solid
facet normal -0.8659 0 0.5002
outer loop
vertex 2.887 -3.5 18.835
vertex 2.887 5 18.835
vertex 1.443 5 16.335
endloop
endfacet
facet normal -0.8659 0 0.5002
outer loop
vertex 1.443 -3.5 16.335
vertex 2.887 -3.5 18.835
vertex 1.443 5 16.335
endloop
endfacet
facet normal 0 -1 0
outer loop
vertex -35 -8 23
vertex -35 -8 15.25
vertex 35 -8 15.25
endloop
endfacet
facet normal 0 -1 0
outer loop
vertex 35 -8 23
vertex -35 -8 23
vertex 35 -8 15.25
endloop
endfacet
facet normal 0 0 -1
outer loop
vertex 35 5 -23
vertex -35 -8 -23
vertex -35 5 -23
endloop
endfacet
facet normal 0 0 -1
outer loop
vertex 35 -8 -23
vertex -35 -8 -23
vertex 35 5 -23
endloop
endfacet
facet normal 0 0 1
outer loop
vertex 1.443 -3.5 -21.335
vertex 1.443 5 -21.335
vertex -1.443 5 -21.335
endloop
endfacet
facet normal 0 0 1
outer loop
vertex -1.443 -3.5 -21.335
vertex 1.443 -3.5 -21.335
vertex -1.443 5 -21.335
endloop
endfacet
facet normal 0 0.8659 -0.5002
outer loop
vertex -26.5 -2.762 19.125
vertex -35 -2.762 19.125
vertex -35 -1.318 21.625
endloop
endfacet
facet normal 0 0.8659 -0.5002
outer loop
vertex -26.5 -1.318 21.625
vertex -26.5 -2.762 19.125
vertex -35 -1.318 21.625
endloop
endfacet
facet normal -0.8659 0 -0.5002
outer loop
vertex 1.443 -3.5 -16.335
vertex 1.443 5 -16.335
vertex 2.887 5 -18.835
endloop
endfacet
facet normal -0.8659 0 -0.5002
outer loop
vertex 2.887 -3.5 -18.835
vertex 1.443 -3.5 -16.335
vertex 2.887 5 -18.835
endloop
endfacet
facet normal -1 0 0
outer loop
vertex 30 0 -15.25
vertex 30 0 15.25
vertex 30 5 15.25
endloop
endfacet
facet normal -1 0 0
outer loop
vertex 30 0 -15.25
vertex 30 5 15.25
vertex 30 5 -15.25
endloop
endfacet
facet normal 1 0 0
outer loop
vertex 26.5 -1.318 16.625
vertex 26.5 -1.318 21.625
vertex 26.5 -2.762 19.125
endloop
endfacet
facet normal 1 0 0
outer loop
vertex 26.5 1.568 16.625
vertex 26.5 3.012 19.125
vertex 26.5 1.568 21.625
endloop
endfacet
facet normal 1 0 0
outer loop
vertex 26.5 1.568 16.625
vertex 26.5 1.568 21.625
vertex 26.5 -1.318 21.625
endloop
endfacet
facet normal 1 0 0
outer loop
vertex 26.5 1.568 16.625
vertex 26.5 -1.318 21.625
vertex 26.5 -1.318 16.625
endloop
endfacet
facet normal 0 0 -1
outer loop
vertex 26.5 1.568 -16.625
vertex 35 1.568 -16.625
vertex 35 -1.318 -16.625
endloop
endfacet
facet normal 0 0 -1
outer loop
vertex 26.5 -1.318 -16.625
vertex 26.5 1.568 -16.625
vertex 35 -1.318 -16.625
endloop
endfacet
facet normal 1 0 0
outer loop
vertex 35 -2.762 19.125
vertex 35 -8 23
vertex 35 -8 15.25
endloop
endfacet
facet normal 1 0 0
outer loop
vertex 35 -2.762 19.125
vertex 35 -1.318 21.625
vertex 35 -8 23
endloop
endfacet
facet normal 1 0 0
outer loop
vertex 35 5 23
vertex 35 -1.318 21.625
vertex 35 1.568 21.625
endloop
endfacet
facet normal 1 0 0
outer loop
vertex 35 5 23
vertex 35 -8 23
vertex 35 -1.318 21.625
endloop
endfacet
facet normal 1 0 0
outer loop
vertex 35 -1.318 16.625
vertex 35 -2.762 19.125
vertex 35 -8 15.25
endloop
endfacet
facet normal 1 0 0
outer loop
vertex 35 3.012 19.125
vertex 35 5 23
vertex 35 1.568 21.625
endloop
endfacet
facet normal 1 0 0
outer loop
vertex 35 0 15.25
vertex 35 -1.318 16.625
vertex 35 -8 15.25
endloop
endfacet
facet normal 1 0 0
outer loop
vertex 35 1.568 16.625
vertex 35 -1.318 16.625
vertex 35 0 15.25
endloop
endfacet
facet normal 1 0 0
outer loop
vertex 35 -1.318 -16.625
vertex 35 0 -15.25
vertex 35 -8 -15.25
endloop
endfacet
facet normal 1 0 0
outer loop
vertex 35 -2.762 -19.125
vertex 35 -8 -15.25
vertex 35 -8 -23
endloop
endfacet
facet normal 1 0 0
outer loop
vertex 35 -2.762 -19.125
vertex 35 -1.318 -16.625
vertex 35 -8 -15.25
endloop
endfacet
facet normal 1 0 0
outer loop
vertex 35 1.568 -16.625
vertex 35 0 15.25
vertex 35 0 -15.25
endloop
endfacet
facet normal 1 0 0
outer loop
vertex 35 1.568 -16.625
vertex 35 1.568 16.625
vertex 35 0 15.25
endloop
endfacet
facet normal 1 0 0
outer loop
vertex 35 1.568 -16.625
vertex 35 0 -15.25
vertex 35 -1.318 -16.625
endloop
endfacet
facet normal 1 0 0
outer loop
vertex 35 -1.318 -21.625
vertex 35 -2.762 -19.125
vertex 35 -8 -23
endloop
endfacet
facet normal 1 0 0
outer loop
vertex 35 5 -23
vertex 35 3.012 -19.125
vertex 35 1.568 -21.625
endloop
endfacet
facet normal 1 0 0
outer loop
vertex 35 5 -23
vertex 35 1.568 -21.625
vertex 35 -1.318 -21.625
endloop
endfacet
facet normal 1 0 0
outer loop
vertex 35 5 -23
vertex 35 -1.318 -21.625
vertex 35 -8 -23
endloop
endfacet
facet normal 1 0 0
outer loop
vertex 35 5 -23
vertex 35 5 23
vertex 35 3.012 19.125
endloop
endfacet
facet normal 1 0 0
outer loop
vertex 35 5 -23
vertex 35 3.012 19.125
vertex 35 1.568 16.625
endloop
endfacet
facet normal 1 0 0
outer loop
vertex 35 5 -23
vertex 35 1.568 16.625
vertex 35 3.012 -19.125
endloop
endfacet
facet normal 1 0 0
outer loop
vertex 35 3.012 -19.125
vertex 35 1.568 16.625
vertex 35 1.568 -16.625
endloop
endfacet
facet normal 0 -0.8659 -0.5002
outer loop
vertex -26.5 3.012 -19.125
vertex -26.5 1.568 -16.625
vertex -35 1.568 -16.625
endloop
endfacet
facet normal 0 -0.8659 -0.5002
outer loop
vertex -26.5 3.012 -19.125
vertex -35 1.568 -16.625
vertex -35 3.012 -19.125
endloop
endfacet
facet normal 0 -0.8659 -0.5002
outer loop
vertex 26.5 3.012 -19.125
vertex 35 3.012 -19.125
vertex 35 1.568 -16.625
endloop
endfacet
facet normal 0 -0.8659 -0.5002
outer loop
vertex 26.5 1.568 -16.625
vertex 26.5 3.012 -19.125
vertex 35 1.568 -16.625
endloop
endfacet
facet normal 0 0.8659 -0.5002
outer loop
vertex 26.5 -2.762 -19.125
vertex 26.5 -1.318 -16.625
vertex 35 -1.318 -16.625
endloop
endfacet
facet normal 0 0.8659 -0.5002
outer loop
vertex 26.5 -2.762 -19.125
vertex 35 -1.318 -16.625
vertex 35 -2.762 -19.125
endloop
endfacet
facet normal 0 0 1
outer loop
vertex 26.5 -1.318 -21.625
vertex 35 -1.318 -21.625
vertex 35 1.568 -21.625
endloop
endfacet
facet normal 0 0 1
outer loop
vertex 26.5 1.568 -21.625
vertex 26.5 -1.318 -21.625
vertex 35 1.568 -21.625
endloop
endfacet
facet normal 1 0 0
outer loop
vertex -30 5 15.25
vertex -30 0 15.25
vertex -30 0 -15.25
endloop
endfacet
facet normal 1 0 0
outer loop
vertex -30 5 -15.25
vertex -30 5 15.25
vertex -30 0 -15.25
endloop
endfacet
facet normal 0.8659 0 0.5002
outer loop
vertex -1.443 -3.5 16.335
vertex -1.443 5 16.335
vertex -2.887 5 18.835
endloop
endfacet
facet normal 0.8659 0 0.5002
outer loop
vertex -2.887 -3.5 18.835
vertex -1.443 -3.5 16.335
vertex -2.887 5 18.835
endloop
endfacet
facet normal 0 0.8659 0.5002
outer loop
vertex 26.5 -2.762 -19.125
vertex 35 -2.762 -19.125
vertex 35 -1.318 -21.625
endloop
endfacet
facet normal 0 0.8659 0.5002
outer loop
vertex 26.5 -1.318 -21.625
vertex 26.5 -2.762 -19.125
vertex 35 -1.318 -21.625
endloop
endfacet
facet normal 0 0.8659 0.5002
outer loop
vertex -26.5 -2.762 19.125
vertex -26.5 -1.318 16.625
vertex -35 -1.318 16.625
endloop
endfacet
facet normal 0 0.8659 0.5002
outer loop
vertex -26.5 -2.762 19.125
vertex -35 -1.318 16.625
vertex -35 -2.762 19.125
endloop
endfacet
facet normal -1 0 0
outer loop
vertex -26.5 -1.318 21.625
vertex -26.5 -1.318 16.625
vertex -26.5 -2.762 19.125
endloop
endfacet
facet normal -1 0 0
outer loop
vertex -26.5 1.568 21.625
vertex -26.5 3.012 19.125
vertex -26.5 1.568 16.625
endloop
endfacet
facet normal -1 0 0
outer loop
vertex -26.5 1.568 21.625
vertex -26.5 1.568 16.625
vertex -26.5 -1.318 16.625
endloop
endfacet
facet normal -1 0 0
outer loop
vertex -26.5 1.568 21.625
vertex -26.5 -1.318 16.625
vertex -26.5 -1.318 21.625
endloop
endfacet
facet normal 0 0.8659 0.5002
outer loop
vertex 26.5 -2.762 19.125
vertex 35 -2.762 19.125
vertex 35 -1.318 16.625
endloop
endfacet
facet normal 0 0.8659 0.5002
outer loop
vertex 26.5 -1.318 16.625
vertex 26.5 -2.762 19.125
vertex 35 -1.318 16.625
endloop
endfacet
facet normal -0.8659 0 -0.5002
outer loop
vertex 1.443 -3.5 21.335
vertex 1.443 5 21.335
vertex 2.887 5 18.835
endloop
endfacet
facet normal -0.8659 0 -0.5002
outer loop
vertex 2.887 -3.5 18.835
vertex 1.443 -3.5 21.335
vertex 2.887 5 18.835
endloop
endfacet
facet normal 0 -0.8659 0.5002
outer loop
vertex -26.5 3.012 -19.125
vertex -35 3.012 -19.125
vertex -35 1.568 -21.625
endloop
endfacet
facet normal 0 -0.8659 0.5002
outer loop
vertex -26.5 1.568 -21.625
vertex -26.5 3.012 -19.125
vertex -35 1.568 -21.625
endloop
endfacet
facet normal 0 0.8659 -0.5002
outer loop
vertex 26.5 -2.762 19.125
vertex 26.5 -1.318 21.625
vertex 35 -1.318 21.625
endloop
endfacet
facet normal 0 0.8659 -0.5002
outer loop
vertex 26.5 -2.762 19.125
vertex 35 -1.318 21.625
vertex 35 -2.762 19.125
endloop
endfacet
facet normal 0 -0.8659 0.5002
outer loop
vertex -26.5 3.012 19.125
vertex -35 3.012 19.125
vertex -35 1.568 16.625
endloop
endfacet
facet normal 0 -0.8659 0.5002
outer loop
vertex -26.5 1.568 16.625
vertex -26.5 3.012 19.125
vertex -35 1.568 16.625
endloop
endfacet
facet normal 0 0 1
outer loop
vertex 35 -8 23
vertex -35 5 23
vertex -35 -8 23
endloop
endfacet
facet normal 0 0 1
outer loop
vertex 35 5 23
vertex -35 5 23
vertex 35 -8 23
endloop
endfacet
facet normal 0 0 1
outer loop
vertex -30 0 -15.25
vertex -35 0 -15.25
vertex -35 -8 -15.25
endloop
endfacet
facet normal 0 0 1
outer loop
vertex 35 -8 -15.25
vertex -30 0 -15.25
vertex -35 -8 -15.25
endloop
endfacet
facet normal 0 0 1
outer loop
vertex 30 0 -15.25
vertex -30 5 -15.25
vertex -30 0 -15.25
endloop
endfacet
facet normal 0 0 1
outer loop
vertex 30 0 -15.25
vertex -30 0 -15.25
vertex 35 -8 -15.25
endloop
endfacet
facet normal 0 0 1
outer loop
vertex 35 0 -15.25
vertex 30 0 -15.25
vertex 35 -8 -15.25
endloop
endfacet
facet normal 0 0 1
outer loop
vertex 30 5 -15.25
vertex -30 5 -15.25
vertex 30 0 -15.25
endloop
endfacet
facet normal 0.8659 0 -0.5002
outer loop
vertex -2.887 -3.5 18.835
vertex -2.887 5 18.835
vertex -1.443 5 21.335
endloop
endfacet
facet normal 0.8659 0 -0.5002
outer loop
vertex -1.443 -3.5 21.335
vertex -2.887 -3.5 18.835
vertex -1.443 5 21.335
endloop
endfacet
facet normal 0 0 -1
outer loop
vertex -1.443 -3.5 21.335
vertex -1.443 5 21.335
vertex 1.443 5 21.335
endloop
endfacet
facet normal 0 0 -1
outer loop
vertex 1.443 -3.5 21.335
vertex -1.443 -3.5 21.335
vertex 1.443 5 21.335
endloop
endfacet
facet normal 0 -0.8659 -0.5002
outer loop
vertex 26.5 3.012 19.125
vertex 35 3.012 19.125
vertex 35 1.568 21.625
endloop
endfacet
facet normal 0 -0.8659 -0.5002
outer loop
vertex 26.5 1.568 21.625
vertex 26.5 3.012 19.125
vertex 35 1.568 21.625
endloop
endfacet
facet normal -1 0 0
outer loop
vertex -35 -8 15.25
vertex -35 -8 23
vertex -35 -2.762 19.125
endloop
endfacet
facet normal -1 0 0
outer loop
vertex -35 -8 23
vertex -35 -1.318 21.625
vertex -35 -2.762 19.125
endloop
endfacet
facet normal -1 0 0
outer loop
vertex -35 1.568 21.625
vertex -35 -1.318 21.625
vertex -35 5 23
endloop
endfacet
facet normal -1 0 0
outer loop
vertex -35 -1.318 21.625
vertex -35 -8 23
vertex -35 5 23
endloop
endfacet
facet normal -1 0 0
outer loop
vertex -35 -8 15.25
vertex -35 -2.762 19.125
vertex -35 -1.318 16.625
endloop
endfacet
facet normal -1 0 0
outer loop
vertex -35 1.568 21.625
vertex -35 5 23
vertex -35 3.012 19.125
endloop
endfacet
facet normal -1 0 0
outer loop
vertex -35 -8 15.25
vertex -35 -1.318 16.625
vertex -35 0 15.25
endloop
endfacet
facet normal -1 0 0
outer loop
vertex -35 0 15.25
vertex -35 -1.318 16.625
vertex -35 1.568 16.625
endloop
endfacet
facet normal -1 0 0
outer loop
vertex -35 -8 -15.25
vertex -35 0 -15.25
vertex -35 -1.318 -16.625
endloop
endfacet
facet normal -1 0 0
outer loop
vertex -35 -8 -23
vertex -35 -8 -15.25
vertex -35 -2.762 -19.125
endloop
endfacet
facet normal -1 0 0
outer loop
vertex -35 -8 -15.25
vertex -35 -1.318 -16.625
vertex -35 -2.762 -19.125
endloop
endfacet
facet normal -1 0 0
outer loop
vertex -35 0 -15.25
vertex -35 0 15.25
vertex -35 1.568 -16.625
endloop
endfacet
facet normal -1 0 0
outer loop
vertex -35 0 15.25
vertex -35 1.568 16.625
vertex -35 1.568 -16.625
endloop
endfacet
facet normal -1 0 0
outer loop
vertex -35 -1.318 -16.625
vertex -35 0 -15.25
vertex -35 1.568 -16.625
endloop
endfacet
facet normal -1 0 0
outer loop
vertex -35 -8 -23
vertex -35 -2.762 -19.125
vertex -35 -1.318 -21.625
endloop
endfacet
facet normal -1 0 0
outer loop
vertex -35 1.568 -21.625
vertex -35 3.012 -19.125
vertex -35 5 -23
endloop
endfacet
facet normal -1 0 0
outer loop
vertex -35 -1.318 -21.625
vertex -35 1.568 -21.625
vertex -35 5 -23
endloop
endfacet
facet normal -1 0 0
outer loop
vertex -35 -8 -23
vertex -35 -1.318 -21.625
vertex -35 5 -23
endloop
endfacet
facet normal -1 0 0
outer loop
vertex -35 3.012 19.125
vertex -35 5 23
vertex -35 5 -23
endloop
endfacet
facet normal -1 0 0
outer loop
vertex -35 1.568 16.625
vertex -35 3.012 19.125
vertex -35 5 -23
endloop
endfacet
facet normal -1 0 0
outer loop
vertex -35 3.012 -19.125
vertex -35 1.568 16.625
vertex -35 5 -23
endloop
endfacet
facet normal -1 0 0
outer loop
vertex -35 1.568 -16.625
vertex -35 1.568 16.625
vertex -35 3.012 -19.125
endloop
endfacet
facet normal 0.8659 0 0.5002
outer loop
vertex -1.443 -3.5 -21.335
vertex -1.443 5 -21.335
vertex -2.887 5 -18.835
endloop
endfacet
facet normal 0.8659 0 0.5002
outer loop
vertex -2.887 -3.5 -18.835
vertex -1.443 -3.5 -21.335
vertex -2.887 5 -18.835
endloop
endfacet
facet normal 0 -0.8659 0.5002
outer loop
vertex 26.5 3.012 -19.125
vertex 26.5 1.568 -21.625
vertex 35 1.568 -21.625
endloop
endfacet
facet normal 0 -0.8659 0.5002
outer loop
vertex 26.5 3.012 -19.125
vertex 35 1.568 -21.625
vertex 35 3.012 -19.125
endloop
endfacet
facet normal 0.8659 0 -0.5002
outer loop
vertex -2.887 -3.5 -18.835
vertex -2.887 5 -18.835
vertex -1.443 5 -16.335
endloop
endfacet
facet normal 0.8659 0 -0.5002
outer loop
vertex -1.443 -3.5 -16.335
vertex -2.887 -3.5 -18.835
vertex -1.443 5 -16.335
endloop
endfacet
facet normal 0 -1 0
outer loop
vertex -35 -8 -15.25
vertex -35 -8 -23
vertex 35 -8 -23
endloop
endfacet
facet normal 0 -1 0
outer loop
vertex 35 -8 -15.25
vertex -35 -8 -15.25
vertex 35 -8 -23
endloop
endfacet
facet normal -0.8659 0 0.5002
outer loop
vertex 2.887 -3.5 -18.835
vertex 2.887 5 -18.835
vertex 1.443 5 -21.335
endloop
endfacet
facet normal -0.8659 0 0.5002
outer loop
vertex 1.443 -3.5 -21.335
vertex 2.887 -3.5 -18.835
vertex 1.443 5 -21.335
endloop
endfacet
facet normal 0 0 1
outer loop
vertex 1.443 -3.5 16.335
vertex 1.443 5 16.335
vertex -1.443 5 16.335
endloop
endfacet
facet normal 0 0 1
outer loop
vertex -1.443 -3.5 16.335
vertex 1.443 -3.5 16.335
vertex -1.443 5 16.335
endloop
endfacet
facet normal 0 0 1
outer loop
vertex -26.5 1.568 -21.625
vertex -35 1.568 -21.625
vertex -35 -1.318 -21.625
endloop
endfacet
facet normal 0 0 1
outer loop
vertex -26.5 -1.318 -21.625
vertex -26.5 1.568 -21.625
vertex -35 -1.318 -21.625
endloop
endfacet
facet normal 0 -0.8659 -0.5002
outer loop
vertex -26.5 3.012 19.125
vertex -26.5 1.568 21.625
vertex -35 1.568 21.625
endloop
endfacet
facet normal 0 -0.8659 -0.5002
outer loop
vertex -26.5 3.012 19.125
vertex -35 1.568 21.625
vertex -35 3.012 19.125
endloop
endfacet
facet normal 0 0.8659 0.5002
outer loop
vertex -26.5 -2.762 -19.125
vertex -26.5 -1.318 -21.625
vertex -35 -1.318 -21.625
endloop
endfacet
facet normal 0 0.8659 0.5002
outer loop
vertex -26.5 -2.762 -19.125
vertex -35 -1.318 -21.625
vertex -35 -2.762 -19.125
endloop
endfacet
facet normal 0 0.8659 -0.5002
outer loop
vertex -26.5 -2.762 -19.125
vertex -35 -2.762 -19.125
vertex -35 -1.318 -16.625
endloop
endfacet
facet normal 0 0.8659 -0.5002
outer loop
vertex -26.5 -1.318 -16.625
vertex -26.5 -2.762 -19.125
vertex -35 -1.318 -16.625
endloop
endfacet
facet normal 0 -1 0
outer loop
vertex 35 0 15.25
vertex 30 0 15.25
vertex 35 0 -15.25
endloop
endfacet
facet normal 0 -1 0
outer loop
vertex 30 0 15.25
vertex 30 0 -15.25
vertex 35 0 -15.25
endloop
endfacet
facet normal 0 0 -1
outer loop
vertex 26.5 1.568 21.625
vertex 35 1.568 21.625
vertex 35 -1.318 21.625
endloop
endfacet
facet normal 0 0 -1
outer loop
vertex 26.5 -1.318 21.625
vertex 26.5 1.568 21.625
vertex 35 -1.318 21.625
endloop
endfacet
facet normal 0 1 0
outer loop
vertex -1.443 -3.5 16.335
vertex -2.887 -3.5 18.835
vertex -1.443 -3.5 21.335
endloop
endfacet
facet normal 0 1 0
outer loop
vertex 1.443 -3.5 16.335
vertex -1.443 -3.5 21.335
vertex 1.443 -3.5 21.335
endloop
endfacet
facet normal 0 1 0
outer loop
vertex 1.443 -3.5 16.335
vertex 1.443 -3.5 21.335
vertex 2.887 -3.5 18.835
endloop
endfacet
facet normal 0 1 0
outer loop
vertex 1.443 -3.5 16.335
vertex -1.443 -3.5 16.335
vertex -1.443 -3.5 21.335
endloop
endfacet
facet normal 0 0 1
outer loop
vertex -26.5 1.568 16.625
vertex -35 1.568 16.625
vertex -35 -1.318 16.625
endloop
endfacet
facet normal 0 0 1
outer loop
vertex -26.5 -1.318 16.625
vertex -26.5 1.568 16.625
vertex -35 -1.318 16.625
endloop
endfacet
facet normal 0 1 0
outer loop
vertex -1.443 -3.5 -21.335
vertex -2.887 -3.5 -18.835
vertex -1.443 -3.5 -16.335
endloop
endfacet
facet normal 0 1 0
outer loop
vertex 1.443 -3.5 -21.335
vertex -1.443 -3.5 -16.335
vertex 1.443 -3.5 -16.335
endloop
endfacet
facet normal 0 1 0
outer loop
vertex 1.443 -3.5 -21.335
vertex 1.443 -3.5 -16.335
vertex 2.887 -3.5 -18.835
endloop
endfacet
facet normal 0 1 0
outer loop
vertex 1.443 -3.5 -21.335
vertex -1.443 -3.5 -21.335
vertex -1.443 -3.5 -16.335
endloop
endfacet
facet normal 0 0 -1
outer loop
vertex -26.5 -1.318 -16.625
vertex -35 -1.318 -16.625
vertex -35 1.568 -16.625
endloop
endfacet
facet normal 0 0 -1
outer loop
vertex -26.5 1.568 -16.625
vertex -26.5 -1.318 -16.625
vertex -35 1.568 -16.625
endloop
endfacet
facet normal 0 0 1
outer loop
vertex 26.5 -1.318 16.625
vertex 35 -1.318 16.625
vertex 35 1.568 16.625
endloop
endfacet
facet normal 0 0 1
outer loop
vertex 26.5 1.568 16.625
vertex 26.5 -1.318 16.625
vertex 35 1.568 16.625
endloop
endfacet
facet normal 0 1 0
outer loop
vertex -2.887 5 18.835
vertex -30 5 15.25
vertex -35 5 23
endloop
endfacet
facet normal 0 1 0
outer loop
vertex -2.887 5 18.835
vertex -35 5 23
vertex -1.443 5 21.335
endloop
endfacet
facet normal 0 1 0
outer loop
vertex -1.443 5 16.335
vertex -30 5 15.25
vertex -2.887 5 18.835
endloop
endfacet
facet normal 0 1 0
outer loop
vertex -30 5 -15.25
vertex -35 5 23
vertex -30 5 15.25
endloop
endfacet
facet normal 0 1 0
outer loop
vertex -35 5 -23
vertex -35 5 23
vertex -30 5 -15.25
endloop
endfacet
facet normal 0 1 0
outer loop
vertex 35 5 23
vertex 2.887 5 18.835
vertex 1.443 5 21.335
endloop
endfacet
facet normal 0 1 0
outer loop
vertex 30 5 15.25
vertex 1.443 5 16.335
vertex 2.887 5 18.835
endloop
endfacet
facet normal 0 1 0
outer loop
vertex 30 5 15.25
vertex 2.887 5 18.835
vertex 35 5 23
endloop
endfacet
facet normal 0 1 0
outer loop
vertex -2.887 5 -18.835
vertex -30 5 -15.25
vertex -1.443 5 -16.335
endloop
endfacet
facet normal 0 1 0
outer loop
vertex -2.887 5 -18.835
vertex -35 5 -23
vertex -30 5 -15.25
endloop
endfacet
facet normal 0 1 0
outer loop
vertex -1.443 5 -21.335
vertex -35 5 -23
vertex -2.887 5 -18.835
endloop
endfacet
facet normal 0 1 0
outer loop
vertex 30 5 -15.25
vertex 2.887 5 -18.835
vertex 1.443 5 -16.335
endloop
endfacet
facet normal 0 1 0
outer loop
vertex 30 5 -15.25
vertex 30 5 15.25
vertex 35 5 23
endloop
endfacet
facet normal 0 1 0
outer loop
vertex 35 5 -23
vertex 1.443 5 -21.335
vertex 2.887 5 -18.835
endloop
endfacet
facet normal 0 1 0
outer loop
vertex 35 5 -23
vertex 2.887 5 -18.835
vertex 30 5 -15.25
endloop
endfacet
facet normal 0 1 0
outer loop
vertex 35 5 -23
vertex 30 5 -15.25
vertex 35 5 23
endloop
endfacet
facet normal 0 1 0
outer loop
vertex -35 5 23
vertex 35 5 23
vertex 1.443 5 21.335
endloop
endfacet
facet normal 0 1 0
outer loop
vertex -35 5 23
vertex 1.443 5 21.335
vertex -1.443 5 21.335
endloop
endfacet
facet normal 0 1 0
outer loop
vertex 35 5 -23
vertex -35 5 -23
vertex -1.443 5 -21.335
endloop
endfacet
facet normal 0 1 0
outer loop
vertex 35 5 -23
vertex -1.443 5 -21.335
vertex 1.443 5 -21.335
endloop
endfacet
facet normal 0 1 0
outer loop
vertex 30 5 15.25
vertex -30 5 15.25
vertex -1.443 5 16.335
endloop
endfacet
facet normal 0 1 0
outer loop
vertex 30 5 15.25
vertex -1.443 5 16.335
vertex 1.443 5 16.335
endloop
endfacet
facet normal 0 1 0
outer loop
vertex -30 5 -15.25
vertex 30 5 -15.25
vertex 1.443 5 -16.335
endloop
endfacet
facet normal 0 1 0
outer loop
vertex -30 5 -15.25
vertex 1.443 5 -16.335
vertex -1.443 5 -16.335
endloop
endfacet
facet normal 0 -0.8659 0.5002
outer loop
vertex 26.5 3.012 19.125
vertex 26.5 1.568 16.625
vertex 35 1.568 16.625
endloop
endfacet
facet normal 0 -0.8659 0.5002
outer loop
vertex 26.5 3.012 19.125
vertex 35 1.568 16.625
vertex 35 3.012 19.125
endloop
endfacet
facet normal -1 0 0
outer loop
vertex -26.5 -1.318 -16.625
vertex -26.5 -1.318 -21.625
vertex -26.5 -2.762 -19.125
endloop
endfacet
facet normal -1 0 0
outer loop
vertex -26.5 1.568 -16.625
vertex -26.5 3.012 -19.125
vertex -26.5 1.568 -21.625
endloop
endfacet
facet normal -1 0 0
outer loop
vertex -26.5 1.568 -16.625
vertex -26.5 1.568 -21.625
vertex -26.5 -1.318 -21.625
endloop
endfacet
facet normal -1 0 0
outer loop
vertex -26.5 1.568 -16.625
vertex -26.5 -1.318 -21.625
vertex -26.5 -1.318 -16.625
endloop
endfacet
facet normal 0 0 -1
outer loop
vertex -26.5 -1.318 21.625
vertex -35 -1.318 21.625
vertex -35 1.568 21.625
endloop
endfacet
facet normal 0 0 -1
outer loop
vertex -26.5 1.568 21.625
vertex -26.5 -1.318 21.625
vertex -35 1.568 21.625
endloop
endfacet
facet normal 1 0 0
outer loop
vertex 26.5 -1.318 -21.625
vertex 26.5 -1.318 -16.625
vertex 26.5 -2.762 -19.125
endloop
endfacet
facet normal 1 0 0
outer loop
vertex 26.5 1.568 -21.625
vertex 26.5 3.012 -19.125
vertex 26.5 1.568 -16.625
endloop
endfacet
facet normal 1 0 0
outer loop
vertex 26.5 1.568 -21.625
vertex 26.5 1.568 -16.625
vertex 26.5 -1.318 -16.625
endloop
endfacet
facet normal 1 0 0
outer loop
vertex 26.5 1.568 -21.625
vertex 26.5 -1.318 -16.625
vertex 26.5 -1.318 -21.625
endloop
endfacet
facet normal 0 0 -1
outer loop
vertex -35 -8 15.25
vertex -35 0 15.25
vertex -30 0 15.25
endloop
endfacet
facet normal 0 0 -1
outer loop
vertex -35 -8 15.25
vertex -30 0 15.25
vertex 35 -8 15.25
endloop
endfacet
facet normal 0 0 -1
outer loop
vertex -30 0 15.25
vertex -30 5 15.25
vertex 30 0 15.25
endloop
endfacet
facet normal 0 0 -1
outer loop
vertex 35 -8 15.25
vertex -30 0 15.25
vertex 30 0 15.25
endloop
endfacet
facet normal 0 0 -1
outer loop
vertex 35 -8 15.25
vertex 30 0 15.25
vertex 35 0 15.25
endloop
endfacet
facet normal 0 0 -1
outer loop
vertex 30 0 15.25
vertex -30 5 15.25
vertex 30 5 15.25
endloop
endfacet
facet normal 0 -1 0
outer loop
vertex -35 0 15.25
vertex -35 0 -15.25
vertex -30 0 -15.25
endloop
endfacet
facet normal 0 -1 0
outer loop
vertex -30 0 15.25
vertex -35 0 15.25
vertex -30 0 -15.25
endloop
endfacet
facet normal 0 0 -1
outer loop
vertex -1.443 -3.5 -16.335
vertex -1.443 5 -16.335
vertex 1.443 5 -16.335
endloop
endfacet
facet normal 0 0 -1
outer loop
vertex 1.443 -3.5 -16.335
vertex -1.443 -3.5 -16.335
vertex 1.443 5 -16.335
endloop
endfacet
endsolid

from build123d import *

# Parameters (mm, degrees)
SKETCH1_W           = 70
SKETCH1_H           = 46
BOSS_EXTRUDE1_DEPTH = 5
SKETCH2_W           = 60
SKETCH2_H           = 30.5
CUT_EXTRUDE1_DEPTH  = 5
SKETCH3_W           = 70
SKETCH3_H           = 7.75
BOSS_EXTRUDE2_DEPTH = 8
CUT_EXTRUDE4_DEPTH  = 8.5
CUT_EXTRUDE5_DEPTH  = 8.5
CUT_EXTRUDE6_DEPTH  = 8.5


with BuildPart() as part:
    # Sketch1 → Boss-Extrude1 (new body)
    with BuildSketch(Plane(origin=(0, 0, 0), x_dir=(1, 0, 0), z_dir=(0, 1, 0))):
        Rectangle(SKETCH1_W, SKETCH1_H)
    extrude(amount=BOSS_EXTRUDE1_DEPTH)

    # Sketch2 → Cut-Extrude1 (cut)
    with BuildSketch(Plane(origin=(0, 0, 0), x_dir=(1, 0, 0), z_dir=(0, 1, 0))):
        Rectangle(SKETCH2_W, SKETCH2_H)
    extrude(amount=CUT_EXTRUDE1_DEPTH, mode=Mode.SUBTRACT)

    # Sketch3 → Boss-Extrude2 (add)
    with BuildSketch(Plane(origin=(0, 0, 0), x_dir=(1, 0, 0), z_dir=(0, 1, 0))):
        with Locations((0, -19.125)):
            Rectangle(SKETCH3_W, SKETCH3_H)
        with Locations((0, 19.125)):
            Rectangle(SKETCH3_W, SKETCH3_H)
    extrude(amount=-BOSS_EXTRUDE2_DEPTH)

    # Sketch6 → Cut-Extrude4 (cut)
    with BuildSketch(Plane.ZY.offset(35)):
        Polygon((19.125, -2.761751346), (21.625, -1.318375673), (21.625, 1.568375673), (19.125, 3.011751346), (16.625, 1.568375673), (16.625, -1.318375673), align=None)
        Polygon((-19.125, -2.761751346), (-16.625, -1.318375673), (-16.625, 1.568375673), (-19.125, 3.011751346), (-21.625, 1.568375673), (-21.625, -1.318375673), align=None)
    extrude(amount=-CUT_EXTRUDE4_DEPTH, mode=Mode.SUBTRACT)

    # Sketch7 → Cut-Extrude5 (cut)
    with BuildSketch(Plane(origin=(35, 0, 0), x_dir=(0, 0, -1), z_dir=(1, 0, 0))):
        Polygon((-19.125, -2.761751346), (-16.625, -1.318375673), (-16.625, 1.568375673), (-19.125, 3.011751346), (-21.625, 1.568375673), (-21.625, -1.318375673), align=None)
        Polygon((19.125, -2.761751346), (21.625, -1.318375673), (21.625, 1.568375673), (19.125, 3.011751346), (16.625, 1.568375673), (16.625, -1.318375673), align=None)
    extrude(amount=-CUT_EXTRUDE5_DEPTH, mode=Mode.SUBTRACT)

    # Sketch10 → Cut-Extrude6 (cut)
    with BuildSketch(Plane(origin=(0, 5, 0), x_dir=(1, 0, 0), z_dir=(0, 1, 0))):
        Polygon((2.886751346, 18.835), (1.443375673, 21.335), (-1.443375673, 21.335), (-2.886751346, 18.835), (-1.443375673, 16.335), (1.443375673, 16.335), align=None)
        Polygon((2.886751346, -18.835), (1.443375673, -16.335), (-1.443375673, -16.335), (-2.886751346, -18.835), (-1.443375673, -21.335), (1.443375673, -21.335), align=None)
    extrude(amount=-CUT_EXTRUDE6_DEPTH, mode=Mode.SUBTRACT)


solid = part.part
